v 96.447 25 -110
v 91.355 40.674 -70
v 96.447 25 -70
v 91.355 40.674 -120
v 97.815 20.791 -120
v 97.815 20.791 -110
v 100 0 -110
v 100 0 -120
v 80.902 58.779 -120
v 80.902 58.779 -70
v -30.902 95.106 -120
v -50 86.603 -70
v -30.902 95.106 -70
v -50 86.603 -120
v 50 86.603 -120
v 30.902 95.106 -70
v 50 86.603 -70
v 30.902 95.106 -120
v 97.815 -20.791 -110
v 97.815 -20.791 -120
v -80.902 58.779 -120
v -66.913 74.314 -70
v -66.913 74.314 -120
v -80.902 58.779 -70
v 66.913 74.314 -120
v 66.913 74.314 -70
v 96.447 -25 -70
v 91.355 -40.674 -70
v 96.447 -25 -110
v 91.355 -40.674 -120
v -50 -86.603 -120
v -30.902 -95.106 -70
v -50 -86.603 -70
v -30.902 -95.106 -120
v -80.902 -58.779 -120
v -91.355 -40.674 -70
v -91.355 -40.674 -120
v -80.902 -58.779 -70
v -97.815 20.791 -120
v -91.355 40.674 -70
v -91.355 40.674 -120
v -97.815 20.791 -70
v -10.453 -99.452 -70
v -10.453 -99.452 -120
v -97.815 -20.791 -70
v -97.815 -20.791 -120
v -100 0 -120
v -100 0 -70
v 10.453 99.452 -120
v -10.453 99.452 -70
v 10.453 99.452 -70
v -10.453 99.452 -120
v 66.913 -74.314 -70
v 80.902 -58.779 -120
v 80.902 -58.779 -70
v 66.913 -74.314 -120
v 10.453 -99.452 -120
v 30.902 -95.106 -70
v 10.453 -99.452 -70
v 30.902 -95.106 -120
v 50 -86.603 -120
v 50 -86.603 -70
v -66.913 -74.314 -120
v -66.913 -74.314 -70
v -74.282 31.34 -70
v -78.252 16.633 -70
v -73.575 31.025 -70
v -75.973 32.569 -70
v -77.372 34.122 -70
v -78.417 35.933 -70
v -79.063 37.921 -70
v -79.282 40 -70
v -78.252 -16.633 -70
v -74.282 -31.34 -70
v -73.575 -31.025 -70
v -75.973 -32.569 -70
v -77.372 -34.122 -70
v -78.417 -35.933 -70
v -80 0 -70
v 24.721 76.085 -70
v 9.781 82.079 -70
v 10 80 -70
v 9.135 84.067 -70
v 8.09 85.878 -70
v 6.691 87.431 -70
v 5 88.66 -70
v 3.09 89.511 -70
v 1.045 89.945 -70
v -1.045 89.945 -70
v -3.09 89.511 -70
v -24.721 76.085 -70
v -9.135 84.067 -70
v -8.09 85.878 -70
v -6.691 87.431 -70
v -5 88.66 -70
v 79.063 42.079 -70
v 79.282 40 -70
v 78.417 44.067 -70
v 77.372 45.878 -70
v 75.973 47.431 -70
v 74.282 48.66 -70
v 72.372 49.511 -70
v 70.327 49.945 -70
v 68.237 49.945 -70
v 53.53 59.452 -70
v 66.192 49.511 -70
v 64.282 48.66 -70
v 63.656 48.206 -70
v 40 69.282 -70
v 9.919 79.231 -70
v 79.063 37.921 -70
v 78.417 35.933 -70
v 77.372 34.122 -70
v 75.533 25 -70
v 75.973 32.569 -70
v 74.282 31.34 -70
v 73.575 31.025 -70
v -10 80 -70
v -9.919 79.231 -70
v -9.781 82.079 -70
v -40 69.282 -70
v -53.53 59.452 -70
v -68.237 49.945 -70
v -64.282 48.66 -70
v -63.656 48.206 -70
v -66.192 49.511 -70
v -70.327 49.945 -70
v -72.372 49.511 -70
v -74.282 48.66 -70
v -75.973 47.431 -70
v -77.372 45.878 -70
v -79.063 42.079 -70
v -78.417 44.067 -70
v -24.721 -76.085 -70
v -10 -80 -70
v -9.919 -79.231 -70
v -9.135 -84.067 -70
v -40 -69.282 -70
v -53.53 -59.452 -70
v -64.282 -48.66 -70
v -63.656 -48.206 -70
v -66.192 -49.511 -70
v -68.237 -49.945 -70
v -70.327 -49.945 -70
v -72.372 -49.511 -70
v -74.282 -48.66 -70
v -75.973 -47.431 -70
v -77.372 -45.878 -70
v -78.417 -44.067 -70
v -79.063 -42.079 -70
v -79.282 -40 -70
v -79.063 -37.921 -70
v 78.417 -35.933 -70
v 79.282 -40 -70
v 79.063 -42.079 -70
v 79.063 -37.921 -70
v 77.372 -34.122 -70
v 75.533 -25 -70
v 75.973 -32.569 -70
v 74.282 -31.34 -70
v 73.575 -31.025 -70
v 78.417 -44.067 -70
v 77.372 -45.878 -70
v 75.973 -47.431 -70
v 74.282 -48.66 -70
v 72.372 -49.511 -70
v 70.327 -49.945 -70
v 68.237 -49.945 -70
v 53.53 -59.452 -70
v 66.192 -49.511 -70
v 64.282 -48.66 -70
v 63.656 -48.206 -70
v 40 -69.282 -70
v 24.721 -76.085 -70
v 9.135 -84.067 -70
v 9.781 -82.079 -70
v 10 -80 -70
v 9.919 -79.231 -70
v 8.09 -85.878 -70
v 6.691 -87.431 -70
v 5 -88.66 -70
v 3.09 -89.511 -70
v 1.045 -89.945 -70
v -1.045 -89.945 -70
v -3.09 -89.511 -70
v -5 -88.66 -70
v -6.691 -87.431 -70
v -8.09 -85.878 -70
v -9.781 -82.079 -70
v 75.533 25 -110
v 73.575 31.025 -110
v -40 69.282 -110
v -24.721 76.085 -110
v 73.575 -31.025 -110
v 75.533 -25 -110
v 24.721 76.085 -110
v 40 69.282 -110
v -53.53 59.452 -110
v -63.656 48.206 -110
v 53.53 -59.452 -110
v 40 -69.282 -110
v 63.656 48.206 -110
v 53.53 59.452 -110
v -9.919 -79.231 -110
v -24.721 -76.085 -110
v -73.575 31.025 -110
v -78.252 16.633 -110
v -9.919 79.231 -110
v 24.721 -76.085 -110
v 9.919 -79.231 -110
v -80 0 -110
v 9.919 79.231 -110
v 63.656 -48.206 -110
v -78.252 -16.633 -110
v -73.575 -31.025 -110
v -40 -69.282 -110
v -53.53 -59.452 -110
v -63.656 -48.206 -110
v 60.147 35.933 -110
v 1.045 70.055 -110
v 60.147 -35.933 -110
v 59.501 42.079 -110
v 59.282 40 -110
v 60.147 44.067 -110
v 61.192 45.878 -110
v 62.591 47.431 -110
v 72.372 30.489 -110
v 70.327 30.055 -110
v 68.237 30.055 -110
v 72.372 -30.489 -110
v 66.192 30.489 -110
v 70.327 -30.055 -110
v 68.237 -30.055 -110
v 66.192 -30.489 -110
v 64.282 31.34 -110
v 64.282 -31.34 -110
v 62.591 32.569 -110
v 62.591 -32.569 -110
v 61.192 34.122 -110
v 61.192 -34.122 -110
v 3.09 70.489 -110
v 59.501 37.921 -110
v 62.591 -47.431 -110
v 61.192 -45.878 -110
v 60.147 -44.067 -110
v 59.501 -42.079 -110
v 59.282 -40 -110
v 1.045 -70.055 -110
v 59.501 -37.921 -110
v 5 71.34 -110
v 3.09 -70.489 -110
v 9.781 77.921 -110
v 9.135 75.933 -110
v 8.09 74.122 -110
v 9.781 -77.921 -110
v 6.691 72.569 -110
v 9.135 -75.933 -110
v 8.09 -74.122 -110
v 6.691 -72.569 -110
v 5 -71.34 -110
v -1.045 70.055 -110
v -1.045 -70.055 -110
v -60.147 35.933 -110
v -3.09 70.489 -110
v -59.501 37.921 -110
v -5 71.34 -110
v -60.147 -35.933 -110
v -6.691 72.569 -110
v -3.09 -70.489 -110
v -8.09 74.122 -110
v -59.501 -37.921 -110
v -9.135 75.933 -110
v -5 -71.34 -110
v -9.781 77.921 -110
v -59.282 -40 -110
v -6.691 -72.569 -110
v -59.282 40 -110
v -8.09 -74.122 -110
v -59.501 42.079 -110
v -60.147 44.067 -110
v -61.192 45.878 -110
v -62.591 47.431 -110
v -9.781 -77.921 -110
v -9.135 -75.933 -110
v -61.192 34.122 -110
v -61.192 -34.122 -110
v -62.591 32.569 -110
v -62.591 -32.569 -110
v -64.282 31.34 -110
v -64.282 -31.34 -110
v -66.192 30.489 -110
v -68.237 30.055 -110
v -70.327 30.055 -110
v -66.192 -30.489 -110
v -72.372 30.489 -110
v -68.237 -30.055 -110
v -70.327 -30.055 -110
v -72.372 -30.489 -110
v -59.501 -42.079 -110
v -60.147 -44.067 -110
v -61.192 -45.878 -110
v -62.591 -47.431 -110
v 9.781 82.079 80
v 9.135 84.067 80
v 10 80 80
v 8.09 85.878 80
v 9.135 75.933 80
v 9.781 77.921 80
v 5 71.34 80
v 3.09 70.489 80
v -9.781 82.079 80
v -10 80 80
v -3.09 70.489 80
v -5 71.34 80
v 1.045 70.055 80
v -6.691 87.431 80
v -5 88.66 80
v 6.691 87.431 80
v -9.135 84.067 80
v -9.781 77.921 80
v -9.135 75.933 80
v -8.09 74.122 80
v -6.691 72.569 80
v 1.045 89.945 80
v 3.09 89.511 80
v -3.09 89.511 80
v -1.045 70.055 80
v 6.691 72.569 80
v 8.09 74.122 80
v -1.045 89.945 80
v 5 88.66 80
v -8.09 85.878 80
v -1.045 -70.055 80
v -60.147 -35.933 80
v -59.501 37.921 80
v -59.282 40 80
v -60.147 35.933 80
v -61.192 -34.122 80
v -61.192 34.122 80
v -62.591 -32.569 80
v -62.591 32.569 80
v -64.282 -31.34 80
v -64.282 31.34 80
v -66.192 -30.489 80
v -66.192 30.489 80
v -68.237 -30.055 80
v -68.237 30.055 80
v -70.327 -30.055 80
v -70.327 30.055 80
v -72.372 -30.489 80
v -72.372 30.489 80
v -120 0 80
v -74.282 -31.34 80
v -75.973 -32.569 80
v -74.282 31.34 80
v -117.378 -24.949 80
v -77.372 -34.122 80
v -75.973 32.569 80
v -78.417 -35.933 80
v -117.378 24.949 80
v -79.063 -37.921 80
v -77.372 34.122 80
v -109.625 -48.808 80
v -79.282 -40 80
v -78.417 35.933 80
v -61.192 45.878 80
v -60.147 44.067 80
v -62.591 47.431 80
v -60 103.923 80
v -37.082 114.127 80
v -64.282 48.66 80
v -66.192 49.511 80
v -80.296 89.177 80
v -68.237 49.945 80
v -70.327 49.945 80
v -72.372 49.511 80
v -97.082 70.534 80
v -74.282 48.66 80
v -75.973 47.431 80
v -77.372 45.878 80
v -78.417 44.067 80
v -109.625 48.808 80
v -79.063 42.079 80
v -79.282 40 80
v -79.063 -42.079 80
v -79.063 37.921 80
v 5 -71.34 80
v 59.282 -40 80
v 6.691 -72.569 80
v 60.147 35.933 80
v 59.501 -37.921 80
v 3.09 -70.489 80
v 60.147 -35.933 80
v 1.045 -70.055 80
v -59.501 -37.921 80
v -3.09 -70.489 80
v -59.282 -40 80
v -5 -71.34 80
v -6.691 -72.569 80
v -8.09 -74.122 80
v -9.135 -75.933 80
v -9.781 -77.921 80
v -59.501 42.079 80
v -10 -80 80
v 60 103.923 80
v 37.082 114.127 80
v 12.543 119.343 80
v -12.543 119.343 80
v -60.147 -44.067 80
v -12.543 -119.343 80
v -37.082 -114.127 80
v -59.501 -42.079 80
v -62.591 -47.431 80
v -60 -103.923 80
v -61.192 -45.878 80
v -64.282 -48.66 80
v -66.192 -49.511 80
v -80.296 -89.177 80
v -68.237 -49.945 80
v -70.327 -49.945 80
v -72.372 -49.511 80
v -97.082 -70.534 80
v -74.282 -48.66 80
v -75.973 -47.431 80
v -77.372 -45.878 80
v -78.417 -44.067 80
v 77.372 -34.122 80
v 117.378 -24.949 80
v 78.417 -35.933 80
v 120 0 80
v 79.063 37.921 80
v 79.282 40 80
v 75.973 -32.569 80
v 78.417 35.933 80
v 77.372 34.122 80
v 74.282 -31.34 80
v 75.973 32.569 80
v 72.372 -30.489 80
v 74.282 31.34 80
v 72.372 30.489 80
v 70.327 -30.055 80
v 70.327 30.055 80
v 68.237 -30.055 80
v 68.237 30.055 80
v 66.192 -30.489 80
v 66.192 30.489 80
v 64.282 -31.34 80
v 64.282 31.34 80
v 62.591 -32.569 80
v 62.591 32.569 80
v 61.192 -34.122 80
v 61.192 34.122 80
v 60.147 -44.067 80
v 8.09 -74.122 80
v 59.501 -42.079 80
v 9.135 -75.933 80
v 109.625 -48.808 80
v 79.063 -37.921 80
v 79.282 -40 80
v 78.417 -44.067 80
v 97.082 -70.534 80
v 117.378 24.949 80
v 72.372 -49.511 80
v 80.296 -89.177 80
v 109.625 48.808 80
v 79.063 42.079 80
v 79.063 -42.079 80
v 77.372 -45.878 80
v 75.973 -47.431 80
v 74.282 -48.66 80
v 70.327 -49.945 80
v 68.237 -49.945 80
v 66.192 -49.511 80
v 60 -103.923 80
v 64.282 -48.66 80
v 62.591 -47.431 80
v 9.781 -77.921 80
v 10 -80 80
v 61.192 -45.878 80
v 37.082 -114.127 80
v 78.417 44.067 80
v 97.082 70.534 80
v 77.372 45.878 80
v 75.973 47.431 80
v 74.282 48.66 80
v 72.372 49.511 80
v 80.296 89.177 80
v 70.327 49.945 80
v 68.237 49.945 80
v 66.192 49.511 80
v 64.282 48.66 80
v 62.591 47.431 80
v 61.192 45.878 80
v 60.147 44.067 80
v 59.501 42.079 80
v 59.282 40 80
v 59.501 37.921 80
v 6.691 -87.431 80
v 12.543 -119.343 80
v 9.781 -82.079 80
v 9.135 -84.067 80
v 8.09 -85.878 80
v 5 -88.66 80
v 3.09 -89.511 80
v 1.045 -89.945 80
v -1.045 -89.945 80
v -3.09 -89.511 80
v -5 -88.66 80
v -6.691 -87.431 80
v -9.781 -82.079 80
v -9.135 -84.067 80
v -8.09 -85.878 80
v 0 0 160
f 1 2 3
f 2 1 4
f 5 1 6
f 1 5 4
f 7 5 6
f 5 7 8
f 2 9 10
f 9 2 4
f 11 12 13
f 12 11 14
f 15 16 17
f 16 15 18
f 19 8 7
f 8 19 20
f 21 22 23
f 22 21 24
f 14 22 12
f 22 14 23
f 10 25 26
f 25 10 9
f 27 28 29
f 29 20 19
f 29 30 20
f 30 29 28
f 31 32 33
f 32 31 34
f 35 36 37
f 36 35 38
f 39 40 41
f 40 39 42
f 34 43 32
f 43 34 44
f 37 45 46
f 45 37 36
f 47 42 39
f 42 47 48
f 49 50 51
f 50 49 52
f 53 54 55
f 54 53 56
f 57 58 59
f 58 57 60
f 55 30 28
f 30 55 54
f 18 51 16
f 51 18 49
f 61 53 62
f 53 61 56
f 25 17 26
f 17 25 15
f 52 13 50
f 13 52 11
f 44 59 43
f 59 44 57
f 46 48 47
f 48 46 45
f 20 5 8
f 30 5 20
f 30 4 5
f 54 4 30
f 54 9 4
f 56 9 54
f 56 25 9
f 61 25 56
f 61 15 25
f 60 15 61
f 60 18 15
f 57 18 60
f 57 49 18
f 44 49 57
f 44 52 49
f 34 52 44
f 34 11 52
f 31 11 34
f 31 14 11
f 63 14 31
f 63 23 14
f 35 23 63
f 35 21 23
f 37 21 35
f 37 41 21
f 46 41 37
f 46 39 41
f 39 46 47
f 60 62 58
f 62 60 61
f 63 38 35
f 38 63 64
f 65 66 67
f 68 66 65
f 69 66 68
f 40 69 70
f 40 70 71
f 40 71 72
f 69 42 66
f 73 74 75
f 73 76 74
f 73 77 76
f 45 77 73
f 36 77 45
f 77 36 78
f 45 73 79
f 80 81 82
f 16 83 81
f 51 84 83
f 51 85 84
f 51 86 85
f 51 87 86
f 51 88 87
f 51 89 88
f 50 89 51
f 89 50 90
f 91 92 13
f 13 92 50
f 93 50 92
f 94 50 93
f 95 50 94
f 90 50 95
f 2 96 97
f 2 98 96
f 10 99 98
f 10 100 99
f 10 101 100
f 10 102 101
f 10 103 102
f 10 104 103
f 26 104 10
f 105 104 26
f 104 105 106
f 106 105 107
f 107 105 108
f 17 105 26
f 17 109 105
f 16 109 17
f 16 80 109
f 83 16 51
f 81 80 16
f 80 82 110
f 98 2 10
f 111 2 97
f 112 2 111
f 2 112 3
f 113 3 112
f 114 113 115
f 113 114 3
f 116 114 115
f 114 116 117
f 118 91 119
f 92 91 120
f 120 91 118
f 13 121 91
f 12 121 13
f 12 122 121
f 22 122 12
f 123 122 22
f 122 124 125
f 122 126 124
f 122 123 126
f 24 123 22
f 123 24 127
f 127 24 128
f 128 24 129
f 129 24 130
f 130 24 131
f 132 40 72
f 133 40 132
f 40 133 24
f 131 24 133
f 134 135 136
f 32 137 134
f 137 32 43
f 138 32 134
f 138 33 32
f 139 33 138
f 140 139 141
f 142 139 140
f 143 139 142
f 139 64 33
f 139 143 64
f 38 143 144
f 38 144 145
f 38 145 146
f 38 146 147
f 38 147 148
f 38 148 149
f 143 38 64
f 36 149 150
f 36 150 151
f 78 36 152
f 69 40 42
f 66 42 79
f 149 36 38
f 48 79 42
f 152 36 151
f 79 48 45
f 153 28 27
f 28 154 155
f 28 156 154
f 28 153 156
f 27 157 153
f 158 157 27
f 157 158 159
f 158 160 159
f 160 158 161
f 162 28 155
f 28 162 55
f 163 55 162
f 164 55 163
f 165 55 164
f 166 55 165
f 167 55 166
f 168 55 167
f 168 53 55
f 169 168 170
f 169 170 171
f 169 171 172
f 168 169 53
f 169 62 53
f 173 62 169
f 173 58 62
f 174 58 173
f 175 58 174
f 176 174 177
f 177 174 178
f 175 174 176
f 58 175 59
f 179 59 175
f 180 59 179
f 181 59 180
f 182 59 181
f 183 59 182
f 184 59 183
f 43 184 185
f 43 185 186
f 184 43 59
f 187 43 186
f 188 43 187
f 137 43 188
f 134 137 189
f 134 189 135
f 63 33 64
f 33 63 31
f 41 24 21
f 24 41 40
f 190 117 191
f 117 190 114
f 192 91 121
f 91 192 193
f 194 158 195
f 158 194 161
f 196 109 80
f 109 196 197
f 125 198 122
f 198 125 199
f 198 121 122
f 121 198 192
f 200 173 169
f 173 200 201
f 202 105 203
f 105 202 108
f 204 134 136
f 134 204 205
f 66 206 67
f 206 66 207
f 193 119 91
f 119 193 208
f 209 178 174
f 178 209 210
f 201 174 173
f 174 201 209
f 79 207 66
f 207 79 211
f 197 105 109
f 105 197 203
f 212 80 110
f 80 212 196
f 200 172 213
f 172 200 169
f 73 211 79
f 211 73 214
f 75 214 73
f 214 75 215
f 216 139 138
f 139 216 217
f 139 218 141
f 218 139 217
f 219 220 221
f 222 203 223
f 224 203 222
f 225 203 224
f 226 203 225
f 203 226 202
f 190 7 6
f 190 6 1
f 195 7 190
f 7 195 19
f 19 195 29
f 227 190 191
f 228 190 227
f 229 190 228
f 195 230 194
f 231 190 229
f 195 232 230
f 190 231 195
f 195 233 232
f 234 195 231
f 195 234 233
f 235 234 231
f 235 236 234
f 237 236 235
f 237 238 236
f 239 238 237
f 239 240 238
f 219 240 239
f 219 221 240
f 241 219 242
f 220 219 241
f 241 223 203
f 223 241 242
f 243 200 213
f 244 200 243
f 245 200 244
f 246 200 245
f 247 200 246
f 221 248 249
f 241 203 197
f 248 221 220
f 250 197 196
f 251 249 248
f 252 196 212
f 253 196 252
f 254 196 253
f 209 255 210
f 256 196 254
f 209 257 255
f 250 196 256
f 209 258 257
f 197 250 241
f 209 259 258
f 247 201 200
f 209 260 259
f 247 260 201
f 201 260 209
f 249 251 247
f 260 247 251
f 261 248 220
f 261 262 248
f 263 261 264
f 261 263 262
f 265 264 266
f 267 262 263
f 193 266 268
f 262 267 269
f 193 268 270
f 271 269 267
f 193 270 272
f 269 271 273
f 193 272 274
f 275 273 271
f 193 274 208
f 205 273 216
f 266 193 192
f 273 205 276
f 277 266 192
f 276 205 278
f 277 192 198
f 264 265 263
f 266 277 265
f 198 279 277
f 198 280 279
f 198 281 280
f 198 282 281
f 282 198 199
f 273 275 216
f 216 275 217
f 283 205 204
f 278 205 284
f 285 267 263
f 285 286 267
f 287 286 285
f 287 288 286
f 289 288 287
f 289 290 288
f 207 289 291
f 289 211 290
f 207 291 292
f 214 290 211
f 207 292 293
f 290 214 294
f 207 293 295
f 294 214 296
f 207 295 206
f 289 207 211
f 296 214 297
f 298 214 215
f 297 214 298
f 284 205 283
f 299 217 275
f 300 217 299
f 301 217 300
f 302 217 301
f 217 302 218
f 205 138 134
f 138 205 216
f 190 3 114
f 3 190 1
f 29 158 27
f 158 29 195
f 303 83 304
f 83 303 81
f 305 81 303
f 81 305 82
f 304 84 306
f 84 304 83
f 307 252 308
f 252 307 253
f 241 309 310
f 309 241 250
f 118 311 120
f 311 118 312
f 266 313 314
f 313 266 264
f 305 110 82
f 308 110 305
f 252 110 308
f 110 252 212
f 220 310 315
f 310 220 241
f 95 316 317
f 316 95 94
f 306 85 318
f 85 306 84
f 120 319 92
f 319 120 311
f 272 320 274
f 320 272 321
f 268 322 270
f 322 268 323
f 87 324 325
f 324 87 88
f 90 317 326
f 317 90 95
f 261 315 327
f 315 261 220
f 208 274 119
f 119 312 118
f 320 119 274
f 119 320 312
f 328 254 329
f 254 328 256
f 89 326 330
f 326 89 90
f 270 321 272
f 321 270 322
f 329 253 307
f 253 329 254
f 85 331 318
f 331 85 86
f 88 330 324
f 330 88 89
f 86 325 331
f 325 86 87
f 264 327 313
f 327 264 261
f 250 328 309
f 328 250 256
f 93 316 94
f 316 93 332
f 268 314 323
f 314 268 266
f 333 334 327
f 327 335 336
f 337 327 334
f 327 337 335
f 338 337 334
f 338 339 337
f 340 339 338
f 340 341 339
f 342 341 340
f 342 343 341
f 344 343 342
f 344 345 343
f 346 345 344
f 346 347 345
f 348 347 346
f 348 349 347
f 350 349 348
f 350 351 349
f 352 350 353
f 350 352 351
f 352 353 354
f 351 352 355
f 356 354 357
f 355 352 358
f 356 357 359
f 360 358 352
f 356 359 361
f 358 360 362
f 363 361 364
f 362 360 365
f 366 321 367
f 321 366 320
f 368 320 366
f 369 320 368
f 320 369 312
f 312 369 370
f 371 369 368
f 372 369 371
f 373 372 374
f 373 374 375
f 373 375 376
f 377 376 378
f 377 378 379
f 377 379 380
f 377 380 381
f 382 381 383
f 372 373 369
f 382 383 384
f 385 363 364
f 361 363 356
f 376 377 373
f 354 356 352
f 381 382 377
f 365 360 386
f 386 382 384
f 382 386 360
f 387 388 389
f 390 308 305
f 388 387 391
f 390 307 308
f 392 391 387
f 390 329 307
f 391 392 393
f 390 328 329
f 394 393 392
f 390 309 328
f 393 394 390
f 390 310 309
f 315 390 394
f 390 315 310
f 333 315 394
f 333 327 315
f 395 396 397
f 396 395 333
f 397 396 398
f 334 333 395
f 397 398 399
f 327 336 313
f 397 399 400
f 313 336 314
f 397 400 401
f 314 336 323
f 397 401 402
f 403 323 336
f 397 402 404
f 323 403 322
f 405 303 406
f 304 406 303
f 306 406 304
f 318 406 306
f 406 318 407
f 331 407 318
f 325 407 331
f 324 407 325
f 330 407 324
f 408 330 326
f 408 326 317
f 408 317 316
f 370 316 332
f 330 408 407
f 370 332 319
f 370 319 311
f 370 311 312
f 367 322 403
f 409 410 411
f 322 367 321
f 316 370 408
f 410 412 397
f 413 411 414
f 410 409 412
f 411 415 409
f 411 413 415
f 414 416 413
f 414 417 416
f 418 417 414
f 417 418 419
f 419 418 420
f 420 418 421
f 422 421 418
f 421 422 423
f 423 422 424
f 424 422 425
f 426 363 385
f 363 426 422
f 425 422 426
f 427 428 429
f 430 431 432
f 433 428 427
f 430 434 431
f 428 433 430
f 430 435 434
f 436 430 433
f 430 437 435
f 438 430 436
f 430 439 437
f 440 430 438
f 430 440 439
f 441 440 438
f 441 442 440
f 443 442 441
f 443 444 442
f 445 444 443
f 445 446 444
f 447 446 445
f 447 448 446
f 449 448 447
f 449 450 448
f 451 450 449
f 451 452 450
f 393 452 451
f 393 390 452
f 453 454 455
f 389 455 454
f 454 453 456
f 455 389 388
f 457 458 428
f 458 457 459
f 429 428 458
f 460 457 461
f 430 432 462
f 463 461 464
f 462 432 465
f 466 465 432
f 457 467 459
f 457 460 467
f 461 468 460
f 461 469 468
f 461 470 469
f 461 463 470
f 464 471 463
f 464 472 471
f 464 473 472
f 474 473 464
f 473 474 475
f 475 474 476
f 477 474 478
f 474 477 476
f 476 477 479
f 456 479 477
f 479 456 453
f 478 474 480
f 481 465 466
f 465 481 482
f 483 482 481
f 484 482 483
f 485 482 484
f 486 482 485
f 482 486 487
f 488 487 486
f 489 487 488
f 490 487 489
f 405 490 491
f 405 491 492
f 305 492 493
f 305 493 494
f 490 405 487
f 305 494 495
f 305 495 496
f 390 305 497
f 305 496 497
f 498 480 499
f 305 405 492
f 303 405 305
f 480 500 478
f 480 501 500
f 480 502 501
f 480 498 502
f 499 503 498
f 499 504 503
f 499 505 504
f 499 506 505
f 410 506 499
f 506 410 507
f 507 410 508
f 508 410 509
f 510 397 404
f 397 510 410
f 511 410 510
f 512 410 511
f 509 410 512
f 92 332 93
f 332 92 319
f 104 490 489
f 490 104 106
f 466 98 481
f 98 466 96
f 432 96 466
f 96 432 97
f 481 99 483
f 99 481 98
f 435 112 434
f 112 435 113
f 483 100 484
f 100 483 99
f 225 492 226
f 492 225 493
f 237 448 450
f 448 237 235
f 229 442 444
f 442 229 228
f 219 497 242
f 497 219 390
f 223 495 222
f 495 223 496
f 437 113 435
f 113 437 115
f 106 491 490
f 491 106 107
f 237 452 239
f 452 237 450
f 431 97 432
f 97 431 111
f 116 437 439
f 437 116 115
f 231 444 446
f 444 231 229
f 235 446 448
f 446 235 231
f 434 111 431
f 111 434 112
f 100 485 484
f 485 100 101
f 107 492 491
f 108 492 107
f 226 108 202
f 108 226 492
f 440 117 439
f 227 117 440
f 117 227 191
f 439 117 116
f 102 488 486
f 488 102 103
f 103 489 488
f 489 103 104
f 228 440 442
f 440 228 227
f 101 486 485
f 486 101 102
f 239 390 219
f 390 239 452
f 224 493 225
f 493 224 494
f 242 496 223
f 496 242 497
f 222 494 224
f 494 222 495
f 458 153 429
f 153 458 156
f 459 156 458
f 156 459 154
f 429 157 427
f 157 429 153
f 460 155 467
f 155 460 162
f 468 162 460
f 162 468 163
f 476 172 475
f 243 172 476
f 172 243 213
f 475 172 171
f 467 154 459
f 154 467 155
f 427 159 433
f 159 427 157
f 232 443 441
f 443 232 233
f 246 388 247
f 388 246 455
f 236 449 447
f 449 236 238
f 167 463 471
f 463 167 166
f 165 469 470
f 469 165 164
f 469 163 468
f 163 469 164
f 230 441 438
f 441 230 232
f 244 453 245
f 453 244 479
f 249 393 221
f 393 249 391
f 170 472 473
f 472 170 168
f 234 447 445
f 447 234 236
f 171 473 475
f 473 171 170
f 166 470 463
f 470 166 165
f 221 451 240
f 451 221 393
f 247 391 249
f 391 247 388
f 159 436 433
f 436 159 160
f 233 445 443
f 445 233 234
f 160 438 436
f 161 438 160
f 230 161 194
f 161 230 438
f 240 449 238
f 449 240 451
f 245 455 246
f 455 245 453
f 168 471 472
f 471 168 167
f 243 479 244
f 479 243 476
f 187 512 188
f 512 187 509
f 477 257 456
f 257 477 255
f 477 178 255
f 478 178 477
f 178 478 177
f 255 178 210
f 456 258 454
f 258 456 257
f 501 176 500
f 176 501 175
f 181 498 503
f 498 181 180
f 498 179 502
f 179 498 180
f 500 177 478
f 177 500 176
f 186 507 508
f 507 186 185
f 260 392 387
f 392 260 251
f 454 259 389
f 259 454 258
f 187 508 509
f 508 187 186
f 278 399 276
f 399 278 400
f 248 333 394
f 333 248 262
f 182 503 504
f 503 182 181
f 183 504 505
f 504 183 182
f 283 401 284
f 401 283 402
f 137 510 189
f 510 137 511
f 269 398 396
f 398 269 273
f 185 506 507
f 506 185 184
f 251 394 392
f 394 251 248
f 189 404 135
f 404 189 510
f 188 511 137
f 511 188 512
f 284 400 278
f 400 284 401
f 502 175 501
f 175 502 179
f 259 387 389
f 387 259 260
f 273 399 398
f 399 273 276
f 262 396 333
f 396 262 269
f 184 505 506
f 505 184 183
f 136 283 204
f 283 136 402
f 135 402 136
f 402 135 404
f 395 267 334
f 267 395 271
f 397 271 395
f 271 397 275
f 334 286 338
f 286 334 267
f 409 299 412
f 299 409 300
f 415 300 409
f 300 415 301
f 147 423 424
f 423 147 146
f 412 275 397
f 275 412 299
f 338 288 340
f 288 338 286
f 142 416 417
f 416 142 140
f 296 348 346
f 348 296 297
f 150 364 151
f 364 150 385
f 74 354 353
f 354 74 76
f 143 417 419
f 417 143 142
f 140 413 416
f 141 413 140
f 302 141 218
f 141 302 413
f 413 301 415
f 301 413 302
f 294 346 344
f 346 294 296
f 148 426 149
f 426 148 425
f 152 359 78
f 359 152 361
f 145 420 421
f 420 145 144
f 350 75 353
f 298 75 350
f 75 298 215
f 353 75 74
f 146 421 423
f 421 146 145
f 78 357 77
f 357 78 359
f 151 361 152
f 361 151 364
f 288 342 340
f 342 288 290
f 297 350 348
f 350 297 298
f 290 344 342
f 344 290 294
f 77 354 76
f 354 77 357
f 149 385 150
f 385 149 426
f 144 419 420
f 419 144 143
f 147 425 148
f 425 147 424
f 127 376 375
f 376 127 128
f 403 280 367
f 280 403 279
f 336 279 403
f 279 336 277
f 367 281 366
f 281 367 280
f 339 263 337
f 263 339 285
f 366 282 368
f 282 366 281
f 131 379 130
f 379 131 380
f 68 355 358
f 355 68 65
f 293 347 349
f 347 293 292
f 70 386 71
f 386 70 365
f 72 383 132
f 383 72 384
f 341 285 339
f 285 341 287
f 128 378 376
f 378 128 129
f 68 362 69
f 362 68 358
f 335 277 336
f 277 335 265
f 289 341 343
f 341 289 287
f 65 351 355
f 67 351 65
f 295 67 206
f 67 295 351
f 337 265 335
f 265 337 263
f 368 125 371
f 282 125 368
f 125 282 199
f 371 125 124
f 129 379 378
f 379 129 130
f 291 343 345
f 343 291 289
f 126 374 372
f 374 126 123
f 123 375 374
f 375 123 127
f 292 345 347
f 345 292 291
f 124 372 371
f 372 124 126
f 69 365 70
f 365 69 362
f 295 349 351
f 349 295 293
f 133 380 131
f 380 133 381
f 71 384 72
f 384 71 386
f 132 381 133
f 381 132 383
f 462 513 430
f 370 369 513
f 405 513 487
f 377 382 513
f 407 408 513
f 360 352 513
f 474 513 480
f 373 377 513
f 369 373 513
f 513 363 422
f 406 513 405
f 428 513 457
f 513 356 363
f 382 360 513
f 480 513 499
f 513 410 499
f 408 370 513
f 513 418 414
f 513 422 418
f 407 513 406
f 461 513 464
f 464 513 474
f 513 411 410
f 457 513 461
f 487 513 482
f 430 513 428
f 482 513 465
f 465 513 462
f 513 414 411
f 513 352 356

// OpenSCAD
translate(v = [0, 0, -120])
union(){difference(){cylinder(h = 50, r = 100.000);
translate(v = [0, 0, 10])
cylinder(h = 50, r = 80.000);
translate(v = [100, 0, 35])
cube(size = [50, 50, 50], center = true);
}
translate(v = [0.000, 80.000])
cylinder(h = 200, r = 10.000);
translate(v = [69.282, 40.000])
cylinder(h = 200, r = 10.000);
translate(v = [69.282, -40.000])
cylinder(h = 200, r = 10.000);
translate(v = [0.000, -80.000])
cylinder(h = 200, r = 10.000);
translate(v = [-69.282, -40.000])
cylinder(h = 200, r = 10.000);
translate(v = [-69.282, 40.000])
cylinder(h = 200, r = 10.000);
translate(v = [0, 0, 200])
cylinder(h = 80, r1 = 120.000, r2 = 0.000);
}
